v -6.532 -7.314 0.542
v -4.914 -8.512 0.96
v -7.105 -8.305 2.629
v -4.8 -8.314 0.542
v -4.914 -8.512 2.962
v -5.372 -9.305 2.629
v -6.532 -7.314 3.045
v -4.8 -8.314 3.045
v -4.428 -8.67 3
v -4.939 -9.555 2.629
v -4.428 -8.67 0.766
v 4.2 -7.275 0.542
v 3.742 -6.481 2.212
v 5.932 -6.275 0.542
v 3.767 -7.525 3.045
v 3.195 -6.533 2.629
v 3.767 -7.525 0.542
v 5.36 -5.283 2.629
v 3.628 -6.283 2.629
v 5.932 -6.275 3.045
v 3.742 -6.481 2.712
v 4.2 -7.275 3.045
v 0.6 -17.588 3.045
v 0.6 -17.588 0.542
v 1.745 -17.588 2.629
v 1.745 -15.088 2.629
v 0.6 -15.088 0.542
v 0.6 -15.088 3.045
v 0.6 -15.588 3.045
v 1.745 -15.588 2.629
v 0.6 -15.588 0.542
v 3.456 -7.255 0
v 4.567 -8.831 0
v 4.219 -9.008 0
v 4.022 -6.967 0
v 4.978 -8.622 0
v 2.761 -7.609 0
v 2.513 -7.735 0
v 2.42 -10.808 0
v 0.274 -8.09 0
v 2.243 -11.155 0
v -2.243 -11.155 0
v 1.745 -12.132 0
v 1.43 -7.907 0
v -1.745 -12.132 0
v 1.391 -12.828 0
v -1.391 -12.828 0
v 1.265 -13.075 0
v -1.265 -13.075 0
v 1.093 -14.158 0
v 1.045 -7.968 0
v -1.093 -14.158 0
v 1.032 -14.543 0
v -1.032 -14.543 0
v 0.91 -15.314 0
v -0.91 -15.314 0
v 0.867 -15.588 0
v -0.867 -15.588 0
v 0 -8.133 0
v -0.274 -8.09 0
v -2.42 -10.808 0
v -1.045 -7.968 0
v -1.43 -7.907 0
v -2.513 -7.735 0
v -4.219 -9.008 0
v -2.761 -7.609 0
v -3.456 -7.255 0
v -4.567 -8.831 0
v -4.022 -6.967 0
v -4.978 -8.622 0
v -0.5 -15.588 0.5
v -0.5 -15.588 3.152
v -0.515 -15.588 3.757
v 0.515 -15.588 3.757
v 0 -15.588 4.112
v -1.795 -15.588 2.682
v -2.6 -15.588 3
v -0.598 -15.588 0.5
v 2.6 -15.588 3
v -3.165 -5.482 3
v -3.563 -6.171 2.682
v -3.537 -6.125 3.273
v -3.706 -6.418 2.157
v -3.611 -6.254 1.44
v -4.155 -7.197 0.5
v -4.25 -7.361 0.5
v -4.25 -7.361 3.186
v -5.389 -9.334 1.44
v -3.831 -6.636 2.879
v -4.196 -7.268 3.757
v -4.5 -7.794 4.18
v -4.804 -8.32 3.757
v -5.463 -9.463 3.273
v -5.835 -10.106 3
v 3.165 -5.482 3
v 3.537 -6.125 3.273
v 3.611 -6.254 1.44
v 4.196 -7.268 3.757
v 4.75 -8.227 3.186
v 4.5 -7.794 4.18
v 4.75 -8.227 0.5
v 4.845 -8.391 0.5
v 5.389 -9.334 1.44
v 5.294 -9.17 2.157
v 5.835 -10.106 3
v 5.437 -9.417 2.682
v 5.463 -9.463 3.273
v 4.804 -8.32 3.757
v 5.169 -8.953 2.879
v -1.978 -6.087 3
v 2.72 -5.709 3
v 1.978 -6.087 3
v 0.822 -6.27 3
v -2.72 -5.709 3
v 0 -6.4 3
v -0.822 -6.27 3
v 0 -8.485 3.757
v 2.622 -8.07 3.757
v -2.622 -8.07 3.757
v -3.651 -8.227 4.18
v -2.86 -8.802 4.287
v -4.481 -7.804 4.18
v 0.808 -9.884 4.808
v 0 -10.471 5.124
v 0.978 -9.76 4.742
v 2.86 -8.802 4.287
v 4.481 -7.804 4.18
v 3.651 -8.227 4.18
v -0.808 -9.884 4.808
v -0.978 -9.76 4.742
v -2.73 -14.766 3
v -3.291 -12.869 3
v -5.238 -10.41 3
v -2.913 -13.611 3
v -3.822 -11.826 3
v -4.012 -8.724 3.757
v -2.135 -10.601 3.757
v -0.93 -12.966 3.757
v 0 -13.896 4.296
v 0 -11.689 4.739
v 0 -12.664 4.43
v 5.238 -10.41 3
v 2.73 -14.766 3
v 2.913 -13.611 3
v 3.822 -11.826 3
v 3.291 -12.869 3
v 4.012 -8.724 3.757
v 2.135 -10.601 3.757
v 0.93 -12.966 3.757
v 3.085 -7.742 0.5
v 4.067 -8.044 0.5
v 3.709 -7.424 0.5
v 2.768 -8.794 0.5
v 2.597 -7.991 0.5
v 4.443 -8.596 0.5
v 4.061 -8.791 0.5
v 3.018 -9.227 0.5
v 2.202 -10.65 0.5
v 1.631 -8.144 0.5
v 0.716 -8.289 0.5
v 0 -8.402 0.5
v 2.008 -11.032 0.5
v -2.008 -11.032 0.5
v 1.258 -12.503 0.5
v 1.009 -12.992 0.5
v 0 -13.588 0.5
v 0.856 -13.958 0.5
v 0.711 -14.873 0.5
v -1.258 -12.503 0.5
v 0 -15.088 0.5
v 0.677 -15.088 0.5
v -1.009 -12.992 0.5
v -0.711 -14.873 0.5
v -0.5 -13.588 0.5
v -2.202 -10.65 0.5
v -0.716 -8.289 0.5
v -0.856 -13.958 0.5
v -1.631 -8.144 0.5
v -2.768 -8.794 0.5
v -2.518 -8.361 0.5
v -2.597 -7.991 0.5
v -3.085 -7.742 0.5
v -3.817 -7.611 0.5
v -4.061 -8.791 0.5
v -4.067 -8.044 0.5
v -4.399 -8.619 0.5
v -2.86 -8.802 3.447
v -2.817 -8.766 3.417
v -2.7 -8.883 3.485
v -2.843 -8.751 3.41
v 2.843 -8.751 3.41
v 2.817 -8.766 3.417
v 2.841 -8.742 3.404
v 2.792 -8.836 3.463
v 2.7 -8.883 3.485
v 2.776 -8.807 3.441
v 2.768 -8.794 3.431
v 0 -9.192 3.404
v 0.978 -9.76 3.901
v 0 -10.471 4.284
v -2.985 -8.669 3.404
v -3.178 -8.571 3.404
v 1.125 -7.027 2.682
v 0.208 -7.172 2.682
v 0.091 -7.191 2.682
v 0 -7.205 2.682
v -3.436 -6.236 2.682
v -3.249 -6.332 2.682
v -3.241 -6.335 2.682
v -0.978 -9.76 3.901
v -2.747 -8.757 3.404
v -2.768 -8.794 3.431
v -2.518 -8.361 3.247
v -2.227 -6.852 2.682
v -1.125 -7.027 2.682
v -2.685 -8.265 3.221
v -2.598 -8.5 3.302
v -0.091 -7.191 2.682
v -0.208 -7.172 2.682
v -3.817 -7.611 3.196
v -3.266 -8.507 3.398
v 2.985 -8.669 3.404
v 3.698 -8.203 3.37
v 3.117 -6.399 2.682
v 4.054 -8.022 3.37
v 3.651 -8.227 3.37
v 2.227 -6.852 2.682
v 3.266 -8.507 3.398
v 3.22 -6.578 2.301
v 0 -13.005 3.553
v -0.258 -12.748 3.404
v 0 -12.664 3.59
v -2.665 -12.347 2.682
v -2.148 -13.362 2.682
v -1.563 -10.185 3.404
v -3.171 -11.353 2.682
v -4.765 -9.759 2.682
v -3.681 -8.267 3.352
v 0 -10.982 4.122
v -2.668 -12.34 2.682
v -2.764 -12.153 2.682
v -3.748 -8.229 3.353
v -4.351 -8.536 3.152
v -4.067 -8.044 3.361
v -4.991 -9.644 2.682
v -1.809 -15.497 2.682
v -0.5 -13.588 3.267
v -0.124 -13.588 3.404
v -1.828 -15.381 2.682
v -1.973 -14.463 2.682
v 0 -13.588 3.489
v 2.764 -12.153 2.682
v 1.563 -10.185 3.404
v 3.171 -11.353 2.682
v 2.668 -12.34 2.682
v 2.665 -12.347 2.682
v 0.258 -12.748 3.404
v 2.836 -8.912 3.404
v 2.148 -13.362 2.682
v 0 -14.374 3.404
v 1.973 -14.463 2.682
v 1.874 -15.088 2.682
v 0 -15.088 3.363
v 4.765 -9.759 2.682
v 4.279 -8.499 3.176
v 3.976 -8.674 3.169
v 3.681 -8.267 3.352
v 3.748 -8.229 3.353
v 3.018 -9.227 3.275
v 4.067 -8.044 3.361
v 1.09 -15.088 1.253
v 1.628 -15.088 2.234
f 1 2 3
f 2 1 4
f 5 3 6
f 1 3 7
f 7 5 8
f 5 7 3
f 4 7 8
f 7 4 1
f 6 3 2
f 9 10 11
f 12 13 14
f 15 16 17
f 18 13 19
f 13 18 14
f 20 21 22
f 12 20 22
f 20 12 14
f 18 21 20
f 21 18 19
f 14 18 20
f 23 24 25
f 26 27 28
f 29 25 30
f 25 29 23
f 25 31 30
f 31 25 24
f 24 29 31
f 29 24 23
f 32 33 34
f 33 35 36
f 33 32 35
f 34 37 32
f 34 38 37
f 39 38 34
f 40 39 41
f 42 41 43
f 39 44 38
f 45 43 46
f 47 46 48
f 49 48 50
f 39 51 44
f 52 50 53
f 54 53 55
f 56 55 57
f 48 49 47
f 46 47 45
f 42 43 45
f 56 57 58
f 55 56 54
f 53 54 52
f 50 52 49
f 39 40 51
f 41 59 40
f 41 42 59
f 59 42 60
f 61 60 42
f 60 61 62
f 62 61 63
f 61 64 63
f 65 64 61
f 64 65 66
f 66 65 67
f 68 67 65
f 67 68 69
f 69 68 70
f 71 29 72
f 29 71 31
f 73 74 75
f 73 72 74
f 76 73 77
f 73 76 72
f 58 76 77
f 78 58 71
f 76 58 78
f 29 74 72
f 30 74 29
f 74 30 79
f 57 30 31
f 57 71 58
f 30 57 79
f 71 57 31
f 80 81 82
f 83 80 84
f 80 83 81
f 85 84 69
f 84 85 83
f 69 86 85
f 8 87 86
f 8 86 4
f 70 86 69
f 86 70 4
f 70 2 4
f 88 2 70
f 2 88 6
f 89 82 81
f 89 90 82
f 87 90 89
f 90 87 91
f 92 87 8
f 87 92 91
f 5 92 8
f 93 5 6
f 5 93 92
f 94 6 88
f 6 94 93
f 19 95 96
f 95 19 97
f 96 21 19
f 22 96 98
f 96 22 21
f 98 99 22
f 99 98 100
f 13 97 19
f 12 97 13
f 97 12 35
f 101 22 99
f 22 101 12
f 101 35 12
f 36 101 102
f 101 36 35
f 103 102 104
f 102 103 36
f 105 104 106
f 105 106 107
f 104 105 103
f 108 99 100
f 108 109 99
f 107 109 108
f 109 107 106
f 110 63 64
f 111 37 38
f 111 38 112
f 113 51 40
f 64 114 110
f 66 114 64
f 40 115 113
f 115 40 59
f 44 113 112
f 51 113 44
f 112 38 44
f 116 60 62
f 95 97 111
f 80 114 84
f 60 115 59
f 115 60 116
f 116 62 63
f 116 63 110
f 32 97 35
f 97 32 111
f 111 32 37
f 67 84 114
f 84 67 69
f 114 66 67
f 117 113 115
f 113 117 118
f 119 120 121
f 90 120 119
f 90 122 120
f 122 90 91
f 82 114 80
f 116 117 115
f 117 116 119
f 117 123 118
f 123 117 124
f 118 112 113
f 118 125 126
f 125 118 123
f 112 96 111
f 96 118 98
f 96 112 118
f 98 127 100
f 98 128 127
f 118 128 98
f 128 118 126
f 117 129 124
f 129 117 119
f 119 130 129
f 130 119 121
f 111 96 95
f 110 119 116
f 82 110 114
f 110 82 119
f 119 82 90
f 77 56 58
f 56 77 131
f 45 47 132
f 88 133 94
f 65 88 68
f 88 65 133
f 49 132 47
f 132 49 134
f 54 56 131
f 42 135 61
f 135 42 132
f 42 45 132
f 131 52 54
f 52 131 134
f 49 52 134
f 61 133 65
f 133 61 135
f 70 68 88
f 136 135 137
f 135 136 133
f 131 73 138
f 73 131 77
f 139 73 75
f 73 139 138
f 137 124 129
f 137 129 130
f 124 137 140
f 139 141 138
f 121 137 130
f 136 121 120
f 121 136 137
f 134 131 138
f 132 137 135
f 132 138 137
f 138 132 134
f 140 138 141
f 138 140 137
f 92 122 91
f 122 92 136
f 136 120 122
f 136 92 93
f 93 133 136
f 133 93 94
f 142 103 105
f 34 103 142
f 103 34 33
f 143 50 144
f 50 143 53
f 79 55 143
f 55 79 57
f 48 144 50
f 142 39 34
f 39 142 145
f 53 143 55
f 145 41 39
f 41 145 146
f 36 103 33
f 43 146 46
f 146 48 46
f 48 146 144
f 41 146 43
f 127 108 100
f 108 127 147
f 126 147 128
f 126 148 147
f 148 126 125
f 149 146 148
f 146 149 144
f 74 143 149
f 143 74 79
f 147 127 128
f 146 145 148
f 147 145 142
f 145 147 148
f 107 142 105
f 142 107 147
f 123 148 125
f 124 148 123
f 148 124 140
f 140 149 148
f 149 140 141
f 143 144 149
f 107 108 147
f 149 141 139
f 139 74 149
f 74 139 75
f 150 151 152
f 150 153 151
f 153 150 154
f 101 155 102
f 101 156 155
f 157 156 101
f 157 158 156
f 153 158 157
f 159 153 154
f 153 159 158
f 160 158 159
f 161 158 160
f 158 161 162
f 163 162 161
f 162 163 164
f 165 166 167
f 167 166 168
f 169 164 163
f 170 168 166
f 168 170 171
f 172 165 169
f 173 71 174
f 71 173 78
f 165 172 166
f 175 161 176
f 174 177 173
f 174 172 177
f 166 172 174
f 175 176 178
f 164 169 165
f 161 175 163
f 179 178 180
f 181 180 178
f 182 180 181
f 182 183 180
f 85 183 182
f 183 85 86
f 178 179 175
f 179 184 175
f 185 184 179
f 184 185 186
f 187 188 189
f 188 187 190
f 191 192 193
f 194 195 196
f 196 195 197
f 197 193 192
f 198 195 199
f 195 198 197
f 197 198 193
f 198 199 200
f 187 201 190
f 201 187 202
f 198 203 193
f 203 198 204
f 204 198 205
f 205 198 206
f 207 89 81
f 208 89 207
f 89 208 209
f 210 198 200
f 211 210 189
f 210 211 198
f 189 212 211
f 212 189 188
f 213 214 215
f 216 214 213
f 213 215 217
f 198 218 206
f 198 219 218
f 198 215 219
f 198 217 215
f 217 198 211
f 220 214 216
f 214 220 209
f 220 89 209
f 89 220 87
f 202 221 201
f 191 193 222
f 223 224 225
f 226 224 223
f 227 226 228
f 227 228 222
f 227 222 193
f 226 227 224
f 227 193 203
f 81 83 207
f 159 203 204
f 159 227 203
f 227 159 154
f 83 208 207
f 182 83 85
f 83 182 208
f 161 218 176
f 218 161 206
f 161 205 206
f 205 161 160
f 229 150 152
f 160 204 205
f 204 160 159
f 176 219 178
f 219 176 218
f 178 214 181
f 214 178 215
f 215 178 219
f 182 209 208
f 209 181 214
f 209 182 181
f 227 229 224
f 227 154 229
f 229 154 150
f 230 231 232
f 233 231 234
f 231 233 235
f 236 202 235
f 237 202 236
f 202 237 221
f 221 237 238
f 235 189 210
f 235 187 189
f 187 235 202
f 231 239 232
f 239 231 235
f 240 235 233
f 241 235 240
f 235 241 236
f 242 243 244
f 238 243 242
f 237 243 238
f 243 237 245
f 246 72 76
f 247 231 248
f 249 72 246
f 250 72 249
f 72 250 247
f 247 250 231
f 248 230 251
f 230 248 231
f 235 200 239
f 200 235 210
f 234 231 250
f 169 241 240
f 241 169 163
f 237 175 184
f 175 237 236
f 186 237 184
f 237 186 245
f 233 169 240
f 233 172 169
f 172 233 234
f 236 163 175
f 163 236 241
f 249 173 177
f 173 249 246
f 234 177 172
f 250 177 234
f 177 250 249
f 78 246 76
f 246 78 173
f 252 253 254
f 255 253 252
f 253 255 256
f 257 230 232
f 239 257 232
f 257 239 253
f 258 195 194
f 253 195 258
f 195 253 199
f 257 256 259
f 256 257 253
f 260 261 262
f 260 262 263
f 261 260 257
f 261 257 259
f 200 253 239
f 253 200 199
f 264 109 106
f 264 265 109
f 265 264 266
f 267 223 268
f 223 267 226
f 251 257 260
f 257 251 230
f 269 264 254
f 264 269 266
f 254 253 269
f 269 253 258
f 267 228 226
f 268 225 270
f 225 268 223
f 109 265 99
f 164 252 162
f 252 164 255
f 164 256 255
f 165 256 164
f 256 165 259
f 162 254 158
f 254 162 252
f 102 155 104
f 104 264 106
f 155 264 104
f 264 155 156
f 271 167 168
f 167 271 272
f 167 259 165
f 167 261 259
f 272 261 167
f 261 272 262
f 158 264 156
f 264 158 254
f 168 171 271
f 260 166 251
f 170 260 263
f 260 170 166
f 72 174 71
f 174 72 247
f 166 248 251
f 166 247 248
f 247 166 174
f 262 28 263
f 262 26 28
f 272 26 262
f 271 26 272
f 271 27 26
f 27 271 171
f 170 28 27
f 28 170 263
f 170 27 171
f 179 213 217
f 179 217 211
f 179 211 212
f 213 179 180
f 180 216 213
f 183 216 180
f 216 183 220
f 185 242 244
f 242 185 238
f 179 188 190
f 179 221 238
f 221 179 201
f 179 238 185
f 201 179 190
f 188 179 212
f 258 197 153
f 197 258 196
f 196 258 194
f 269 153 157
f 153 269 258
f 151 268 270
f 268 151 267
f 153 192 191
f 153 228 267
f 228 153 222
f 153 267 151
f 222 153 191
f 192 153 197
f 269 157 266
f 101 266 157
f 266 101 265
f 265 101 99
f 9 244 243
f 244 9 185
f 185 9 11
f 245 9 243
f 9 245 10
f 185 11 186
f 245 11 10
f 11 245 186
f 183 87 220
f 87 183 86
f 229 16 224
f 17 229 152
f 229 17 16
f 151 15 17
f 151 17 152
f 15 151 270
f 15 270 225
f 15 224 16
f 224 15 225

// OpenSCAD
// stones count = 1 + 3 * rr * (rr - 1)

/* [Board] */
// rows count (radius)
rr = 1; // [1:100]
// stone size
dx = 18;
// hexants
pp = 1; // [1:6]
// cut edge
ce = 0;
// stones, not board
so = 0; // [0:1]

/* [Joints] */
// plugs length (0 = none)
jp = 2;
// cuts plugs (radial)
cp = 1; // [0:1]
// edge plugs
ep = 1; // [0:1]
// plug fit
pf = 0.1;
// separated plugs - TODO
ps = 0; // [0:0]

/* [Carving] */
// hollow
hw = 1; // [0:1]
// wall thickness, if hollow
wt = 0.5;
// cuts wall (radial)
cw = 1;
// edge wall
ew = 1;
// ceiling && plugs 45' support - TODO
cs = 0; // [0:0]

/* [Global] */
// details
ds = 20;
// fudge factor
ff = 0.05;

/* [Hidden] */
pp_max = 6;
// hexagon
dq = sqrt(3) / 2;
dy = dx * dq;
dz = dx * 2 / 3;
// stone offset
oz = dx * 5 / 18;
// triangle
tri_dx = (rr + 1) * dx;
tri_dy = rr * dy;
tri_dz = dz / 2;

$fn = ds;

// -----

if (so) {
		translate([0, 0, oz+0.1]) board(pp, pp_max) hexa(rr - 1, dx) rand_flip() {
			color([0,0,0]) render() difference() {
				scale([0.75, 0.75, 0.5]) lentil(dz);
				translate([0, 0, -dx / 2]) cube(dx, center = true);
			}
			color([1,1,1]) render() intersection() {
				scale([0.75, 0.75, 0.5]) lentil(dz);
				translate([0, 0, -dx / 2]) cube(dx, center = true);
			}
		}
} else
translate([0, 0, tri_dz / 2])
union() {
	if (jp && pp < pp_max) union() { // plugs
		if (ep && !ce) hexa(rr, dx, true, true) translate([dx, 0, 0]) extrude([0, wt - jp, 0]) difference() { // edge plugs
			translate([-(dx / 2 - wt) / 2 + pf, wt / 2, wt / 2]) cube([dx / 2 - wt, wt, tri_dz - wt], center = true);
			translate([0, 0, oz - pf]) lentil(dz + 2 * wt);
			translate([-pf, 0, 0]) conus(tri_dz * 3 / 4, dx + 2 * wt) hole(dx, dy, tri_dz) translate([0, 0, oz]) lentil(dz + wt * 3 / 4);
		}
		if (cp) { // radial plugs
			radial_cuts(pp, pp_max, 0.5, rr - 0.5, dx, ce)
				rotate(-90) translate([dx / 2, 0, 0]) extrude([0, wt - jp, 0]) difference() {
				translate([-(dx / 2 - wt) / 2 + pf, wt / 2, wt / 2]) cube([dx / 2 - wt, wt, tri_dz - wt], center = true);
				translate([0, 0, oz - pf]) lentil(dz + 2 * wt);
				translate([-pf, 0, 0]) conus(tri_dz * 3 / 4, dx + 2 * wt) hole(dx, dy, tri_dz) translate([0, 0, oz]) lentil(dz + wt * 3 / 4);
			}
		}
	}
	intersection() {
		board(pp, pp_max) difference() { // solid
			triangle(tri_dx, tri_dy, tri_dz); // board
			hexa(ce ? rr - 1 : rr, dx) carving(dx, dy, tri_dz) translate([0, 0, oz]) lentil(dz); // holes
			if (ce) hexa(rr, dx, true) translate([0, 0, - tri_dz]) linear_extrude(dz) hexagon(dx + ff); // edge
		}
		if (hw) union() { // hollow
			board(pp, pp_max) { // hexants
				translate([0, 0, - tri_dz + wt]) triangle(tri_dx, tri_dy, tri_dz); // bottom
				hexa(ce ? rr - 1 : rr, dx) { // holes walls
					translate([0, 0, oz]) lentil(dz + 2 * wt);
					conus(tri_dz * 3 / 4, dx + 2 * wt) hole(dx, dy, tri_dz) translate([0, 0, oz]) lentil(dz + wt * 3 / 4);
				}
				if (ce) {
					if (ew) hexa(rr, dx, true) translate([0, 0, -tri_dz]) linear_extrude(dz) hexagon(dx + 2 * wt);
				} else {
					if (pp < pp_max && jp && ep) hexa(rr, dx, true, true) {
						translate([(dx - wt) / 2, ps + max(jp - ps, wt) / 2, 0]) cube([wt, max(jp - ps, wt), tri_dz], center = true); // edge sprockets
						if (!ps) translate([dx * 3/4 - wt, wt / 2, 0]) cube([dx / 2, wt, tri_dz], center = true); // edge half-walls
					} else if (ew)
						translate([0, -tri_dy, 0]) cube([tri_dx - dx, 2 * wt, tri_dz], center = true); // edge walls
				}
			}
			if (pp < pp_max) {
				if (jp && cp) {
					if (!(ce && ew) || rr > 1)
						radial_cuts(pp, pp_max, 0.5, rr - (ce && ew ? 1.5 : 0.5), dx)
							translate([ps + max(jp - ps, wt) / 2, wt / 2, 0]) cube([max(jp - ps, wt), wt, tri_dz], center = true); // radial sprockets
					radial_cuts(pp, pp_max, 0.5, rr - 0.5, dx, ce)
						translate([wt / 2, wt - dx / 4, 0]) cube([wt, dx / 2, tri_dz], center = true); // radial half-walls
				} else if (cw)
					radial_cuts(pp, pp_max, 1, 1, (tri_dx - dx) / 2) cube([2 * wt, tri_dx - dx, tri_dz], center = true); // radial walls
			}
		}
	}
}

// -----

module board(count, total) {
	for (i = [0 : count - 1]) translate([0,0,i*(so && pp > 1 ? 0.1 : 0)]) rotate(360 * i / total) children();
}

module triangle(tx, ty, tz) {
	difference() {
		rotate(0) translate([0, -ty / 2, 0])	cube([tx, ty, tz], center = true);
		rotate(60) translate([-tx / 2, ty / 2, 0]) cube([2 + tx, ty, tz * 2], center = true);
		rotate(-60) translate([tx / 2, ty / 2, 0]) cube([2 + tx, ty, tz * 2], center = true);
	}
}

module lentil(radius) {
	scale([1, 1, 0.5]) sphere(r = radius);
}

module hexa(r, x, outline = false, middle = false) {
	y = x * sqrt(3) / 2;
	mod = middle ? 1 : 0;
	for (j = [(outline ? r : mod) : r], i = [0 : j - mod])
		translate([(i - j / 2) * x, -j * y, 0]) children();
}

module carving(x, y, z) {
	spool(z, x) hole(x, y, z) children(); // bottom
	children(); // top
}

module spool(h, q) {
		translate([0, 0, h / 4]) conus(h * 3 / 4, 0) children();
		conus(h * 3 / 4, q) children();
}

module conus(h, q) {
	hull() {
		children();
		resize([q, q, 0]) translate([0, 0, -h]) mirror([0, 0, 1]) children();
	}
}

module hole(x, y, z) {
	intersection() {
		children();
		translate([0, 0, - z / 2]) cube([x, y, z], center = true);
	}
}

module hexagon(h) {
	x = h / 2;
	y = h / sqrt(3);
	polygon([[0, y], [-x, y / 2], [-x, -y / 2], [0, -y], [x, -y / 2], [x, y / 2]]);
}

module extrude(t) {
	hull() {
		children();
		translate(t) mirror([0, 1, 0]) children();
	}
}

module radial_cuts(count, total, min = 0, max = 0, ity = 0, cut_edge = false) {
	if (!cut_edge || max > 1) radial_cut(0, total, [min : max - (cut_edge ? 1 : 0)], ity, 0) children();
	radial_cut(count, total, [min : max], ity, 180) children();
}

module radial_cut(position, total, min_max = [0:0], ity = 0, angle = 0) {
	cut_turns(position, total) cut_steps(min_max, ity) rotate(angle) children();
}

module cut_steps(min_max, ity) {
	for (i = min_max) translate([0, -i * ity, 0]) children();
}

module cut_turns(position, total) {
	rotate((position - 0.5) * 360 / total) children();
}

module rand_flip(angle = 180, axis = [0,1,0]) {
	rotate(angle * round(rands(0,1,1)[0]), axis) children();
}
